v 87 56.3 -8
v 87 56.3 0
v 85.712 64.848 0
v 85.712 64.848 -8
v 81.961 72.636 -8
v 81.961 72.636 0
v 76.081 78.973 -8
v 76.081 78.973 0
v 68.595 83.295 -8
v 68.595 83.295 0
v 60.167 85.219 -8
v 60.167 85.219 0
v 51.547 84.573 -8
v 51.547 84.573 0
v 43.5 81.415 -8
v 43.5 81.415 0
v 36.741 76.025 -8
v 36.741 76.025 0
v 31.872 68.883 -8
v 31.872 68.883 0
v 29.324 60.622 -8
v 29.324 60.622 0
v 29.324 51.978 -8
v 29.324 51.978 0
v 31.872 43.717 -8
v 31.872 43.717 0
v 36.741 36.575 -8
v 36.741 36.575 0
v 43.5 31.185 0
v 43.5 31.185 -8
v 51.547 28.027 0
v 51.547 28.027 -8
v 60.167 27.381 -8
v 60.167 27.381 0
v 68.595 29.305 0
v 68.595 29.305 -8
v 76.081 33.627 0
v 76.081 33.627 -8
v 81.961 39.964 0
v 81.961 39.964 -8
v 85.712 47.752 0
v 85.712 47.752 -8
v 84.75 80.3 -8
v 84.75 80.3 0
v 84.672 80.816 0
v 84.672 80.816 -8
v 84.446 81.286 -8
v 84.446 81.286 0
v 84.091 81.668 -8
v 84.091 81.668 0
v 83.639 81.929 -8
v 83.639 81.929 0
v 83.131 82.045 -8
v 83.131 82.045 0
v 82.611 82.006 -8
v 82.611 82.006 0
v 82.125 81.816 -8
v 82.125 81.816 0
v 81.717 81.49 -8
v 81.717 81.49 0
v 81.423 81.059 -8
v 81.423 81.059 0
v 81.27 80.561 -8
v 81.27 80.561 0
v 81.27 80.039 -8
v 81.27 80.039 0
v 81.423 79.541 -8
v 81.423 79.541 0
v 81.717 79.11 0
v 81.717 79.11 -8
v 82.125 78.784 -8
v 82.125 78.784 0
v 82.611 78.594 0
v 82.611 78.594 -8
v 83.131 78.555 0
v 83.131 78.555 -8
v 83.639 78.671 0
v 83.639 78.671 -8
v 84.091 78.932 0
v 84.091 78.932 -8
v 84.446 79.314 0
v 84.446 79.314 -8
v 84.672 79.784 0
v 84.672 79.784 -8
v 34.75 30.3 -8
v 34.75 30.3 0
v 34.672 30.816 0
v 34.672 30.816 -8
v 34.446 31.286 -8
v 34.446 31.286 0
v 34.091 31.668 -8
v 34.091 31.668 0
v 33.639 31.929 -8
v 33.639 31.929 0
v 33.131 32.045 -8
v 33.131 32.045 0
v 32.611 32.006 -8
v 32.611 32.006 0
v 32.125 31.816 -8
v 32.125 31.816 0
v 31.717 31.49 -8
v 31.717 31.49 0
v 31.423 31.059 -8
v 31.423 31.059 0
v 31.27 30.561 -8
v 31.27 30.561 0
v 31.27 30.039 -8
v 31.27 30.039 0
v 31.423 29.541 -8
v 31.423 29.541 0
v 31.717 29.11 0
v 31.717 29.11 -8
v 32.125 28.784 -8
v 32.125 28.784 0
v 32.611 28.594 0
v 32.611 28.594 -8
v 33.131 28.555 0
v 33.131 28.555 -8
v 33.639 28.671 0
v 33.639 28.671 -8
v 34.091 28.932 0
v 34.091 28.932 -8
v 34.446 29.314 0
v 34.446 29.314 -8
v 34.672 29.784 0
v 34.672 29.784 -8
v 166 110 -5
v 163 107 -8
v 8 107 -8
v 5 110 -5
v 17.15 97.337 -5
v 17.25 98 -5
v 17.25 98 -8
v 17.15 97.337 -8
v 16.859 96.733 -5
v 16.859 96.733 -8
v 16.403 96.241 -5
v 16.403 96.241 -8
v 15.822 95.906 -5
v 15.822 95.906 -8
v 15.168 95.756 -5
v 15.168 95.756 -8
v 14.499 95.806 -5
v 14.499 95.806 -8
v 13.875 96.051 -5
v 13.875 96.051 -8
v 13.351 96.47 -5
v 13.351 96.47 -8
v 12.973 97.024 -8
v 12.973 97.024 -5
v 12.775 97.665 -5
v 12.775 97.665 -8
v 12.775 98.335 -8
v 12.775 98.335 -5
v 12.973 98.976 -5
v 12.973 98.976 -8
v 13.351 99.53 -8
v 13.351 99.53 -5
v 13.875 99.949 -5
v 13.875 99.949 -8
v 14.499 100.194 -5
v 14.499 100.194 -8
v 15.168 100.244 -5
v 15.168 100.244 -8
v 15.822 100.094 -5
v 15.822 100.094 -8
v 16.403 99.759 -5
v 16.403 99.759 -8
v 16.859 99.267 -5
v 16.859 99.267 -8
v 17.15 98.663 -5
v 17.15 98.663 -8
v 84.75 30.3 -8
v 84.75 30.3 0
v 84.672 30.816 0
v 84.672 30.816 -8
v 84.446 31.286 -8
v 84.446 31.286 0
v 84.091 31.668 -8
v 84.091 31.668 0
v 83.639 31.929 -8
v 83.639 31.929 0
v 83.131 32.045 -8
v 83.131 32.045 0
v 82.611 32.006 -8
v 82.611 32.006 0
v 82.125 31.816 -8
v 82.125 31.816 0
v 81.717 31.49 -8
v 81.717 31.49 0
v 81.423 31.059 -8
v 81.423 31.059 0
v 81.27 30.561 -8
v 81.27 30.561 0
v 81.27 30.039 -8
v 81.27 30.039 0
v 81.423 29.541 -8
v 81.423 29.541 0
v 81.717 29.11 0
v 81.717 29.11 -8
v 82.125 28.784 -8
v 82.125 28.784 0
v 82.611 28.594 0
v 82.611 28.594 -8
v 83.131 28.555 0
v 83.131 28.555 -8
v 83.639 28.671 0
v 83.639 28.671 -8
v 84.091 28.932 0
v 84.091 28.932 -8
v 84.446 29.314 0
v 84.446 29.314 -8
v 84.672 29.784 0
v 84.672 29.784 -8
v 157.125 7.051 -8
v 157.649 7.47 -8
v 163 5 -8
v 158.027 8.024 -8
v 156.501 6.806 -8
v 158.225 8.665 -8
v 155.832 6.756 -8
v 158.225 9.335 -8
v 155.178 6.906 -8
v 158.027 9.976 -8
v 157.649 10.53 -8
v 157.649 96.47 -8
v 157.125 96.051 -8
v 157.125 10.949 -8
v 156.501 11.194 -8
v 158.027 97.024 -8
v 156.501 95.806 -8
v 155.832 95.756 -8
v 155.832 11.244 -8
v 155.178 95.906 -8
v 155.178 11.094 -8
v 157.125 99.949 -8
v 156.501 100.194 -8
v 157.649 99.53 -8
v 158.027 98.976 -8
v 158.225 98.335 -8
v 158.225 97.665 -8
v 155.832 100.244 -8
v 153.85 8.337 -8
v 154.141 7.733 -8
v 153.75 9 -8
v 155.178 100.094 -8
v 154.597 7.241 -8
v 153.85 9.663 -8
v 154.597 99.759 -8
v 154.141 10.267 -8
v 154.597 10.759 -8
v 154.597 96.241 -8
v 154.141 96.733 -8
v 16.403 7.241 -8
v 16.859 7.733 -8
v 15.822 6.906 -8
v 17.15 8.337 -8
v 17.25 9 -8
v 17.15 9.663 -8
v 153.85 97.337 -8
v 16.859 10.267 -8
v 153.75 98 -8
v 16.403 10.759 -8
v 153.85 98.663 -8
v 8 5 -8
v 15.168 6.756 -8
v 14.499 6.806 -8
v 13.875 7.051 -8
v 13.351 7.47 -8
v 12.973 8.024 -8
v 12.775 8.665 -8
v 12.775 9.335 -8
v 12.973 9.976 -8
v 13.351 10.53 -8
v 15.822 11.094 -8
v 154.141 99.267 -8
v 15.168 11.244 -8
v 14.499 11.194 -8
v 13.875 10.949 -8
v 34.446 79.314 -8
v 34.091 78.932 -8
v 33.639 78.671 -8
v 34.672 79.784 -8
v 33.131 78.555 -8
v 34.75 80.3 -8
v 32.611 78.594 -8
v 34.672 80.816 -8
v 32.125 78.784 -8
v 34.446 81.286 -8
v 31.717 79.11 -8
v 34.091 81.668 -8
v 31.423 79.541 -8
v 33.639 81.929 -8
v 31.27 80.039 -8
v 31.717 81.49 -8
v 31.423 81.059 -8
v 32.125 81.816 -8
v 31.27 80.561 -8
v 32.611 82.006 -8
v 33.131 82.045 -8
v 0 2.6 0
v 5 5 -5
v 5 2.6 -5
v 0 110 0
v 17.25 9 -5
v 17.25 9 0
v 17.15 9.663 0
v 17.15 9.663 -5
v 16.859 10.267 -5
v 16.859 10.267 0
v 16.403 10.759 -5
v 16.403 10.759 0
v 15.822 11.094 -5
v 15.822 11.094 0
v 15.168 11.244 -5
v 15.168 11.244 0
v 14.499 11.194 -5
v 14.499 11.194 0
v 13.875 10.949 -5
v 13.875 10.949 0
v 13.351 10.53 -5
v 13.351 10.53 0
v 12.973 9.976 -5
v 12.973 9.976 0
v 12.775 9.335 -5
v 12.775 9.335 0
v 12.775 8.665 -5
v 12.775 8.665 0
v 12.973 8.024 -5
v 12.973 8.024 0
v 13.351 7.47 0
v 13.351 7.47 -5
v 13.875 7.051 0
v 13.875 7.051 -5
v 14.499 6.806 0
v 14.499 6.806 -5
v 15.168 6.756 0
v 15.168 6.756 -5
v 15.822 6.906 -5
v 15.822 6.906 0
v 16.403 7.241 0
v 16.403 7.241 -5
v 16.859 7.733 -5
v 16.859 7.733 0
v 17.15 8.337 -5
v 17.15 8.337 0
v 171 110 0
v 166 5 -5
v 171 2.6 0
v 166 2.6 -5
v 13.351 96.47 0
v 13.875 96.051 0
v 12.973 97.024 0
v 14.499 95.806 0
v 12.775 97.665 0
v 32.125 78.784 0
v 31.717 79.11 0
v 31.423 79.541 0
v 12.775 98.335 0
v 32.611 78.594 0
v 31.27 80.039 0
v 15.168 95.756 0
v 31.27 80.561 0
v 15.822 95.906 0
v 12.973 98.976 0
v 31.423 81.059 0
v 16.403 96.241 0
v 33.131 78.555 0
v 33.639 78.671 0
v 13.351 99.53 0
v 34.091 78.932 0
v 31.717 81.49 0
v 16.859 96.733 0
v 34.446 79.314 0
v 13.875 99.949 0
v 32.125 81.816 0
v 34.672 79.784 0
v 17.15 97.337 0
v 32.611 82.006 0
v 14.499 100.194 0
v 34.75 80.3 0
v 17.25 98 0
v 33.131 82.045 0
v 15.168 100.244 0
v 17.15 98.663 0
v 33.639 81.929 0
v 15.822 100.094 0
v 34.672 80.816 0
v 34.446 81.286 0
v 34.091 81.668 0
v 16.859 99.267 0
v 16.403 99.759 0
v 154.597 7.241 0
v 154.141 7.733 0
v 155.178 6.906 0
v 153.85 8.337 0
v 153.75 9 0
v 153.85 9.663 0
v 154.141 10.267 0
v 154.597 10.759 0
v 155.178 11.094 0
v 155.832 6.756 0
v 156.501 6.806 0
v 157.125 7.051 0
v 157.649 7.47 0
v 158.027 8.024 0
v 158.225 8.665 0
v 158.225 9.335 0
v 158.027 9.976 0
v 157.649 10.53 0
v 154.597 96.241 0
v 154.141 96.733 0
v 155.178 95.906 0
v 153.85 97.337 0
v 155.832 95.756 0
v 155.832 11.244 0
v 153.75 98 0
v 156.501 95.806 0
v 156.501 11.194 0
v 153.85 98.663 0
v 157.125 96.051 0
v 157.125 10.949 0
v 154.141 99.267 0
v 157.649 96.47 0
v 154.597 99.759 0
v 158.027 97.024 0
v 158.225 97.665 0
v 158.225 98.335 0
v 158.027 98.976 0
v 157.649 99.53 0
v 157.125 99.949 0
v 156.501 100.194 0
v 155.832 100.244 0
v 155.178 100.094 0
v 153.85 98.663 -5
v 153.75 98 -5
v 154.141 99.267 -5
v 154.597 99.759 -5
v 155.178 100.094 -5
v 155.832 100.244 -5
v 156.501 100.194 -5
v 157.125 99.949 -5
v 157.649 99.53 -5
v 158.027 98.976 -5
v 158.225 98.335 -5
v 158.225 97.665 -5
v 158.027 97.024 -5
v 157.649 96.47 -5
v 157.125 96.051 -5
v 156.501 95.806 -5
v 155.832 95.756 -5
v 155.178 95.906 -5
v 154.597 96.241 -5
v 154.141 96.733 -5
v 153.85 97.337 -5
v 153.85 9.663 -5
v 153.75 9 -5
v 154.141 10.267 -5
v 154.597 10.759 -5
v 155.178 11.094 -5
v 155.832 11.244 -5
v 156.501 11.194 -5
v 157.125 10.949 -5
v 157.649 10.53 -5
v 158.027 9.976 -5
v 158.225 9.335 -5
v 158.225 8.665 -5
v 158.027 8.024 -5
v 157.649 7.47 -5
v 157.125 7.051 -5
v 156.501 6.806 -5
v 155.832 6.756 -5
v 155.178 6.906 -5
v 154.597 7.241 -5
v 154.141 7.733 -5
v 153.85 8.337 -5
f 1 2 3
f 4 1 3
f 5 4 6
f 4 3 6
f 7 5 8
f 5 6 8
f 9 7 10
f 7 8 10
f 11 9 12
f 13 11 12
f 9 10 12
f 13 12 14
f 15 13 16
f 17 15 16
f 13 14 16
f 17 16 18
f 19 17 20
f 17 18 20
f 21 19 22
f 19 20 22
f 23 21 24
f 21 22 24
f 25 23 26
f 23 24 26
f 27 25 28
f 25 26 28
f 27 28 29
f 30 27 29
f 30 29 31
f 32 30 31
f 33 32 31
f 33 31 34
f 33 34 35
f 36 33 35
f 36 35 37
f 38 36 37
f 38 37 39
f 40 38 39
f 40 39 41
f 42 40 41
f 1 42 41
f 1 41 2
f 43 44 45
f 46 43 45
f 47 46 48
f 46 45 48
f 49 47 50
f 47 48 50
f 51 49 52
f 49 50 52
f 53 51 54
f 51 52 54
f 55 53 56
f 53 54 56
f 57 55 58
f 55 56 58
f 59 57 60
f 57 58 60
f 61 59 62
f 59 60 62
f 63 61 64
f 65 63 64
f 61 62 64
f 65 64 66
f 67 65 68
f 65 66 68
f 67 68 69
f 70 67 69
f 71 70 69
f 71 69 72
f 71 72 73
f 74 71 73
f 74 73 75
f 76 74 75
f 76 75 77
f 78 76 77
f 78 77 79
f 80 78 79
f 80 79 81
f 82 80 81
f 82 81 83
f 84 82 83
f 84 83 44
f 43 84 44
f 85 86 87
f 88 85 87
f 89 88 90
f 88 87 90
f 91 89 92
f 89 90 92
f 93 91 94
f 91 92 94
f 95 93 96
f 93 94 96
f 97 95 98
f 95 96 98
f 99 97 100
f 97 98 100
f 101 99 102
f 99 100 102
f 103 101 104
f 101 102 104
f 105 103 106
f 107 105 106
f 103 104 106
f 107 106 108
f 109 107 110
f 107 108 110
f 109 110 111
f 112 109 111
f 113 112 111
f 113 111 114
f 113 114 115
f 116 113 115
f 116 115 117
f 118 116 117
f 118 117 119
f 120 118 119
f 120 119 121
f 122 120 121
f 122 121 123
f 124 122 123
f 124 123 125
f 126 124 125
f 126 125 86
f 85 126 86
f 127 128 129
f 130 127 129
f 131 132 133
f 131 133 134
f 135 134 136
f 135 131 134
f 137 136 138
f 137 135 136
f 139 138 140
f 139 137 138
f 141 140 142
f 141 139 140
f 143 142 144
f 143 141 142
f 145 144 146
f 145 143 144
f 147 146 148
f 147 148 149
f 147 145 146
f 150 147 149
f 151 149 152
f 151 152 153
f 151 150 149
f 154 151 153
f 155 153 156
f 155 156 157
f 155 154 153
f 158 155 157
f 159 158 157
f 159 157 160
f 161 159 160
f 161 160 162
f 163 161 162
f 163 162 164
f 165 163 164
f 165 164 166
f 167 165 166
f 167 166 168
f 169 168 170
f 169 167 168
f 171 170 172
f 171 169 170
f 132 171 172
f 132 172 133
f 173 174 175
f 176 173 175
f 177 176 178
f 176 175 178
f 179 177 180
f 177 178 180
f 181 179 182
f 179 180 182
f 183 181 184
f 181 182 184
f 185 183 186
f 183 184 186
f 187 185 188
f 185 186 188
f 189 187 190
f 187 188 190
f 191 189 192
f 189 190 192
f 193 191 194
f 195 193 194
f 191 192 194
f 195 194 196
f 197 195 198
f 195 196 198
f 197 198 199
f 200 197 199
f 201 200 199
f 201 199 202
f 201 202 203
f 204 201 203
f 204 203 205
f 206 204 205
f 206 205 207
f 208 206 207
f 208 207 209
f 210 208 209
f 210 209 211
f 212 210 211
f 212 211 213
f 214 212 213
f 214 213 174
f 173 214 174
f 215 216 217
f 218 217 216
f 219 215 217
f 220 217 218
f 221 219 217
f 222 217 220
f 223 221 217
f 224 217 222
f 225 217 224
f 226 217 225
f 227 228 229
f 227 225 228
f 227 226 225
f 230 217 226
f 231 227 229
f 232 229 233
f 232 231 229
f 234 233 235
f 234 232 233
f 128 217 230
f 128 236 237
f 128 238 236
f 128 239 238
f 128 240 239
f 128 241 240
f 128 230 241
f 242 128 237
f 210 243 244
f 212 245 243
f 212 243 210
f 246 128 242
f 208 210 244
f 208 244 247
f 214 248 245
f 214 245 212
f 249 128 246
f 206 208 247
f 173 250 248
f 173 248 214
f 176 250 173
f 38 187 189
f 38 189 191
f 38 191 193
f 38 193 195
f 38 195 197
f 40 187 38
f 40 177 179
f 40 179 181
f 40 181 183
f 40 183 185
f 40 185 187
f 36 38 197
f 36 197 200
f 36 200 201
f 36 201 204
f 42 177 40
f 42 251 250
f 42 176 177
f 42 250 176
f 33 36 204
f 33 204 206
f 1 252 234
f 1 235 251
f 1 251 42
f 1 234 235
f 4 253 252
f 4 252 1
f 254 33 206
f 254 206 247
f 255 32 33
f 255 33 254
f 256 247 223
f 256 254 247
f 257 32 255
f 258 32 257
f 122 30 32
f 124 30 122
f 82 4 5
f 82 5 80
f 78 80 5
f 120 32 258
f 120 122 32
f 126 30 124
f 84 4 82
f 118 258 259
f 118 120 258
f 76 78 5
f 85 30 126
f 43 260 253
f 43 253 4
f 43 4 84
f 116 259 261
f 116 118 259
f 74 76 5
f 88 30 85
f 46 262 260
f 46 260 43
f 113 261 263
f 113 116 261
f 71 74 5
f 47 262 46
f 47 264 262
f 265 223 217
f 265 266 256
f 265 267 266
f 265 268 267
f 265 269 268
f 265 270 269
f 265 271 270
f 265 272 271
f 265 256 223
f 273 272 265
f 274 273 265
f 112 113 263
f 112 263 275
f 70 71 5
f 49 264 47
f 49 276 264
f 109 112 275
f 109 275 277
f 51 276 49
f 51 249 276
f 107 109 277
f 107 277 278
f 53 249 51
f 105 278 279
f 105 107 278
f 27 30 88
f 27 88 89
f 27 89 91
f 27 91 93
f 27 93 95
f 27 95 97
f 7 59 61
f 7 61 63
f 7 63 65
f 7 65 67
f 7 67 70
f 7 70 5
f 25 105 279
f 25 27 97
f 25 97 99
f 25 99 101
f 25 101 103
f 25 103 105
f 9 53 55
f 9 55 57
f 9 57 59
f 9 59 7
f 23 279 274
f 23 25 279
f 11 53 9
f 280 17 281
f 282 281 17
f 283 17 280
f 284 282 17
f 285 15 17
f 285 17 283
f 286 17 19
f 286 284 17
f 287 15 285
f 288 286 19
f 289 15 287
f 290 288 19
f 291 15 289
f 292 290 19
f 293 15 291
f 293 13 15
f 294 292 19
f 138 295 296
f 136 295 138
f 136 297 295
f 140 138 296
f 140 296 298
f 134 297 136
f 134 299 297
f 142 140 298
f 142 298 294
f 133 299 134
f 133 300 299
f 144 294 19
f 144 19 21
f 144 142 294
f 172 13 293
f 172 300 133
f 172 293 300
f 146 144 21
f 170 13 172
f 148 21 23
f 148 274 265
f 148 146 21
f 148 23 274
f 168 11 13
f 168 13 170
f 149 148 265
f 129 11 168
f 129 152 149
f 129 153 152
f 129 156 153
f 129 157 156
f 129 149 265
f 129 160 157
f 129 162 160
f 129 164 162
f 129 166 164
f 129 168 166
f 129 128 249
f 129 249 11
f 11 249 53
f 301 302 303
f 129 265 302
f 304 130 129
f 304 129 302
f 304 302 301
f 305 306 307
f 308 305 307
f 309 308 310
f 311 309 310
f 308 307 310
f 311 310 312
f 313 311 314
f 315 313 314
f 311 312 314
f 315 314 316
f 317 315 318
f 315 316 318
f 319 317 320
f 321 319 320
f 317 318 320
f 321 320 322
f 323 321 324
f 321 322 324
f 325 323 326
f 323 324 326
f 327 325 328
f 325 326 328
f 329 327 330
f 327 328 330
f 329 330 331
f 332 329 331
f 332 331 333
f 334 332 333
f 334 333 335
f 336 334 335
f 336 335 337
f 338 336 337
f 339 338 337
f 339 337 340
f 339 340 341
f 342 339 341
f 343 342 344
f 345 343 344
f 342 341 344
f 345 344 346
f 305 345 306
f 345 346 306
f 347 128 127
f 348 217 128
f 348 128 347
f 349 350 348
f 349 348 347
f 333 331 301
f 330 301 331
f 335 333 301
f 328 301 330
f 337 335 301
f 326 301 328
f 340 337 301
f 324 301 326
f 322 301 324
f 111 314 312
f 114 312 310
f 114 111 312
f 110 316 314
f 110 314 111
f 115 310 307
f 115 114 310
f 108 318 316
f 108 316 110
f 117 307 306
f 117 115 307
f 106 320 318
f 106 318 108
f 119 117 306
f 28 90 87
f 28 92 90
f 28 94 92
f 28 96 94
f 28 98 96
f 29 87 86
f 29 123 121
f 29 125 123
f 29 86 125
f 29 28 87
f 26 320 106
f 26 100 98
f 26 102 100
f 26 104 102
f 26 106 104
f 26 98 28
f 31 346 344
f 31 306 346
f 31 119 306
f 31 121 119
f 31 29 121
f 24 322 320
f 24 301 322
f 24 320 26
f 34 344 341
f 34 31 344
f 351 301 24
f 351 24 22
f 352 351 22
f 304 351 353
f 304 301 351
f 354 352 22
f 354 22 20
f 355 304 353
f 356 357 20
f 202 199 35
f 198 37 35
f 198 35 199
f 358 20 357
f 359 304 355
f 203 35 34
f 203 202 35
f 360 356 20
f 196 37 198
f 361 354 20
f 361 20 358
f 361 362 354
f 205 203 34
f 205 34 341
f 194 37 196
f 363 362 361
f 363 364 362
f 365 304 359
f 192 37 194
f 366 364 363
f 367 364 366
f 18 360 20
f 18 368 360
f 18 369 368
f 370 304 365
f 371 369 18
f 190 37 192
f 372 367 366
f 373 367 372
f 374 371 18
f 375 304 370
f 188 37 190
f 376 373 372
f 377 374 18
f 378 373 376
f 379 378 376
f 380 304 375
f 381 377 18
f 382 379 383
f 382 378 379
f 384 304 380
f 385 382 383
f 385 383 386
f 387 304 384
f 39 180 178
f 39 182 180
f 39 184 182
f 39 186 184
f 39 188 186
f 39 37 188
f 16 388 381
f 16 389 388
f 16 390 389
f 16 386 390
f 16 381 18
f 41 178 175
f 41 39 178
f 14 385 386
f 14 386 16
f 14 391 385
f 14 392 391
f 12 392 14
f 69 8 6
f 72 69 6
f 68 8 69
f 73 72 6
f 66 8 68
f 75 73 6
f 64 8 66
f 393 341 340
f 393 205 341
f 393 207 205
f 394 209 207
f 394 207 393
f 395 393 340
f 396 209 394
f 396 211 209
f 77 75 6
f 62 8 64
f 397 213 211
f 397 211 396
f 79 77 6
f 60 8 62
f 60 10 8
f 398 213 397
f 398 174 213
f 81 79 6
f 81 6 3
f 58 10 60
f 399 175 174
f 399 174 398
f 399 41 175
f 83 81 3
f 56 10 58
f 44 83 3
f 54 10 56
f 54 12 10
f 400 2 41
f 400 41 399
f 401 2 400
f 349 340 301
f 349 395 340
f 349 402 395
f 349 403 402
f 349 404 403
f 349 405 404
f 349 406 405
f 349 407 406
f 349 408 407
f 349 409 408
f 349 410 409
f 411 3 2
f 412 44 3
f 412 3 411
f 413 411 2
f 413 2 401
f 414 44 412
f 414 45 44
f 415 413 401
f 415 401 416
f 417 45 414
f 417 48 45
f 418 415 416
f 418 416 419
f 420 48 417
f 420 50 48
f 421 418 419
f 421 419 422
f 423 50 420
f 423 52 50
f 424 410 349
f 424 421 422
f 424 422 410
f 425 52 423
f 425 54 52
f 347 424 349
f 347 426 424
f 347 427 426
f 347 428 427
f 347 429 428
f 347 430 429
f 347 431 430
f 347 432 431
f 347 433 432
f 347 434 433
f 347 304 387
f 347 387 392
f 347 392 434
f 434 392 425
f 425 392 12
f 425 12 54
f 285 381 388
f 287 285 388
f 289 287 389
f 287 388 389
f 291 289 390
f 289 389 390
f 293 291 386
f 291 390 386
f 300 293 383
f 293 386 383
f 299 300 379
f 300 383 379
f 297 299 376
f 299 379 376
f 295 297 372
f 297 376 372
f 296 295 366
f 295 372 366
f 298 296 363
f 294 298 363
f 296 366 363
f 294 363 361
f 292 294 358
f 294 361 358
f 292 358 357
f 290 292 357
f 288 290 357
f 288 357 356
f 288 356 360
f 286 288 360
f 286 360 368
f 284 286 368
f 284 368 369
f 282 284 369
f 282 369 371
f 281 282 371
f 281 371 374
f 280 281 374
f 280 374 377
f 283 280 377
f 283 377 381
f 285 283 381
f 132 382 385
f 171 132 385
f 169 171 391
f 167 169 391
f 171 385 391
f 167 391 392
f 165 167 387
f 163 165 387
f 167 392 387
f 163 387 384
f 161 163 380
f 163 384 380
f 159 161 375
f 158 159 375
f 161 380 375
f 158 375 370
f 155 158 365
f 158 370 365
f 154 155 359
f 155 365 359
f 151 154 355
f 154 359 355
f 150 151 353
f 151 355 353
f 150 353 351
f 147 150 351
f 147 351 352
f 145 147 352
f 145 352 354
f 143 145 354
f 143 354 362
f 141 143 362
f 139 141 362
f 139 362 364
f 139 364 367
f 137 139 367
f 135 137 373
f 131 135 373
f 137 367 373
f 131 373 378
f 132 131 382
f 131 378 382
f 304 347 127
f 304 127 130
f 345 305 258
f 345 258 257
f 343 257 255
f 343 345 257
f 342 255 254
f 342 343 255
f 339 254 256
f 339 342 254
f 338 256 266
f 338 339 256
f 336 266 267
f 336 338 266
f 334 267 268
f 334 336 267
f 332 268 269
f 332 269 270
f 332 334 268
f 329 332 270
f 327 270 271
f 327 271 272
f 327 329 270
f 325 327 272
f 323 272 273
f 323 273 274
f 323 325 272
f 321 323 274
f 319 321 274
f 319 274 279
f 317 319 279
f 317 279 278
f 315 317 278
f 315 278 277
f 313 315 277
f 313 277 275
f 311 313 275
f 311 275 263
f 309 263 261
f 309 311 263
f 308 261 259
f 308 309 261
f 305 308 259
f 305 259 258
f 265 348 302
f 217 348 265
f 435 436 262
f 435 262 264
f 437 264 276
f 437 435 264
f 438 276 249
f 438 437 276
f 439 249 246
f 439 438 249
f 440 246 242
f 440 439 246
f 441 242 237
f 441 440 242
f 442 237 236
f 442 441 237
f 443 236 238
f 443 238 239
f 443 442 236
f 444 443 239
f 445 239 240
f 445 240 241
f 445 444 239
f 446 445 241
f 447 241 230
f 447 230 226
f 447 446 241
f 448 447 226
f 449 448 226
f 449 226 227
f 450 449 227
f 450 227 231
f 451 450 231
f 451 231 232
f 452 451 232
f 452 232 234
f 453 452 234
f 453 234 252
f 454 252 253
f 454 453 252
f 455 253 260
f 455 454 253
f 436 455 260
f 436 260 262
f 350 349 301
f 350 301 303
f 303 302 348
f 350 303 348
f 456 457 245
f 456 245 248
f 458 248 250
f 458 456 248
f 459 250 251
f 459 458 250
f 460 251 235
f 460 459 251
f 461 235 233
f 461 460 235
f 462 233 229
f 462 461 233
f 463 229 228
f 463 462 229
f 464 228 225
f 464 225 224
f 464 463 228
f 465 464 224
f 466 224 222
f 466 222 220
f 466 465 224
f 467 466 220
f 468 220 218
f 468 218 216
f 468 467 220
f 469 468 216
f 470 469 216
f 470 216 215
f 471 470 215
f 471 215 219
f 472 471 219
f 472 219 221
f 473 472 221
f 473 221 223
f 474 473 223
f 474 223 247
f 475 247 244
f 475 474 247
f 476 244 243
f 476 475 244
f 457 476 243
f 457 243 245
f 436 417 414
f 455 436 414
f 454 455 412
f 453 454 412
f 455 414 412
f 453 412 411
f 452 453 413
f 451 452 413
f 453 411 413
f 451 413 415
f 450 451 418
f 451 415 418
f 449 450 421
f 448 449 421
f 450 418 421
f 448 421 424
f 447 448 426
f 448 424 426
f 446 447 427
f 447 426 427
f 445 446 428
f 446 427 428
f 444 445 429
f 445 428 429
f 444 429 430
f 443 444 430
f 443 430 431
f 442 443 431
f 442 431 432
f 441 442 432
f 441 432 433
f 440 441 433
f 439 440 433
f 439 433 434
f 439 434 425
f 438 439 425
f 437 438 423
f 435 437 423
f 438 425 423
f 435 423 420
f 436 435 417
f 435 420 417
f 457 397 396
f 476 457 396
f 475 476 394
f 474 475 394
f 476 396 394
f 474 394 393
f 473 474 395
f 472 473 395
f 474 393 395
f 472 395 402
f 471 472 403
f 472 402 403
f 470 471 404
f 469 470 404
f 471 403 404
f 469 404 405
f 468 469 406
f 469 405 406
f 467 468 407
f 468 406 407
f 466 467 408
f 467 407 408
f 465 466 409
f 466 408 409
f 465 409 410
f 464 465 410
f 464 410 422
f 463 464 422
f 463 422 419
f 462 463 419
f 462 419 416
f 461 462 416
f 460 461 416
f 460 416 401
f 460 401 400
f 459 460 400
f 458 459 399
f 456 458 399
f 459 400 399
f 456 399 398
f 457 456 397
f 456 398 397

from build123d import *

# Parameters (mm, degrees)
SKETCH1_W           = 171
SKETCH1_H           = 110
SKETCH1_R           = 2.25
BOSS_EXTRUDE1_DEPTH = 5
SKETCH2_W           = 171
SKETCH2_H           = 105
SKETCH2_R           = 2.25
BOSS_EXTRUDE2_DEPTH = 3
CHAMFER1_SIZE       = 8
CHAMFER3_SIZE       = 3
SKETCH3_W           = 7.071067812
SKETCH3_H           = 2.6
CUT_EXTRUDE1_DEPTH  = 232.587308883
SKETCH4_R           = 29
SKETCH4_R_2         = 1.75
CUT_EXTRUDE2_DEPTH  = 204.482185952


with BuildPart() as part:
    # Sketch1 → Boss-Extrude1 (new body)
    with BuildSketch(Plane.XY):
        with Locations((85.5, 55)):
            Rectangle(SKETCH1_W, SKETCH1_H)
        with Locations((15, 9)):
            Circle(SKETCH1_R, mode=Mode.SUBTRACT)
        with Locations(Location((156, 9, 0), (0, 0, 180))):
            Circle(SKETCH1_R, mode=Mode.SUBTRACT)
        with Locations((15, 98)):
            Circle(SKETCH1_R, mode=Mode.SUBTRACT)
        with Locations(Location((156, 98, 0), (0, 0, 180))):
            Circle(SKETCH1_R, mode=Mode.SUBTRACT)
    extrude(amount=-BOSS_EXTRUDE1_DEPTH)

    # Sketch2 → Boss-Extrude2 (add)
    with BuildSketch(Plane(origin=(0, 0, -5), x_dir=(-1, 0, 0), z_dir=(0, 0, -1))):
        with Locations((-85.5, 57.5)):
            Rectangle(SKETCH2_W, SKETCH2_H)
        with Locations(Location((-15, 9, 0), (0, 0, 180))):
            Circle(SKETCH2_R, mode=Mode.SUBTRACT)
        with Locations((-156, 9)):
            Circle(SKETCH2_R, mode=Mode.SUBTRACT)
        with Locations(Location((-15, 98, 0), (0, 0, 180))):
            Circle(SKETCH2_R, mode=Mode.SUBTRACT)
        with Locations((-156, 98)):
            Circle(SKETCH2_R, mode=Mode.SUBTRACT)
    extrude(amount=BOSS_EXTRUDE2_DEPTH)

    # Chamfer1
    # the kernel refuses this chamfer: 8 mm, written as the material it takes off along each edge
    with BuildSketch(Plane(origin=(171, -15.573463904, -8), x_dir=(-0.9996219169112968, 0, -0.027495876610586296), z_dir=(0, 1, 0)), Plane(origin=(0, 130.573463904, -8), x_dir=(0.9996219169112968, 0, -0.027495876610586275), z_dir=(0, -1, 0))) as chamfer1_piece_1:
        Polygon((CHAMFER1_SIZE * 0.999621916911, CHAMFER1_SIZE * 0.0274958766106), (-CHAMFER1_SIZE * 0.0274958766106, CHAMFER1_SIZE * 0.999621916911), (0, 0), align=None)
    extrude(amount=146.146927807, mode=Mode.SUBTRACT)

    # Chamfer3
    chamfer3_edges = [part.edges().sort_by_distance(p)[0] for p in [
        (85.5, 110, -8),
    ]]
    chamfer(chamfer3_edges, length=CHAMFER3_SIZE)

    # Sketch3 → Cut-Extrude1 (cut, through all, along a direction that is not the sketch's normal)
    with BuildSketch(Plane(origin=(85.5, 0, -85.5), x_dir=(-0.7071067811865452, 0, -0.7071067811865498), z_dir=(0.7071067811865498, 0, -0.7071067811865452))):
        with Locations((-117.379725677, 1.3)):
            Rectangle(SKETCH3_W, SKETCH3_H)
    extrude(amount=-CUT_EXTRUDE1_DEPTH, dir=(1, 0, 0), mode=Mode.SUBTRACT)

    # Sketch4 → Cut-Extrude2 (cut, through all)
    with BuildSketch(Plane.XY):
        with Locations((58, 56.3)):
            Circle(SKETCH4_R)
        with Locations((33, 80.3)):
            Circle(SKETCH4_R_2)
        with Locations((83, 80.3)):
            Circle(SKETCH4_R_2)
        with Locations((83, 30.3)):
            Circle(SKETCH4_R_2)
        with Locations((33, 30.3)):
            Circle(SKETCH4_R_2)
    extrude(amount=-CUT_EXTRUDE2_DEPTH, mode=Mode.SUBTRACT)


solid = part.part
